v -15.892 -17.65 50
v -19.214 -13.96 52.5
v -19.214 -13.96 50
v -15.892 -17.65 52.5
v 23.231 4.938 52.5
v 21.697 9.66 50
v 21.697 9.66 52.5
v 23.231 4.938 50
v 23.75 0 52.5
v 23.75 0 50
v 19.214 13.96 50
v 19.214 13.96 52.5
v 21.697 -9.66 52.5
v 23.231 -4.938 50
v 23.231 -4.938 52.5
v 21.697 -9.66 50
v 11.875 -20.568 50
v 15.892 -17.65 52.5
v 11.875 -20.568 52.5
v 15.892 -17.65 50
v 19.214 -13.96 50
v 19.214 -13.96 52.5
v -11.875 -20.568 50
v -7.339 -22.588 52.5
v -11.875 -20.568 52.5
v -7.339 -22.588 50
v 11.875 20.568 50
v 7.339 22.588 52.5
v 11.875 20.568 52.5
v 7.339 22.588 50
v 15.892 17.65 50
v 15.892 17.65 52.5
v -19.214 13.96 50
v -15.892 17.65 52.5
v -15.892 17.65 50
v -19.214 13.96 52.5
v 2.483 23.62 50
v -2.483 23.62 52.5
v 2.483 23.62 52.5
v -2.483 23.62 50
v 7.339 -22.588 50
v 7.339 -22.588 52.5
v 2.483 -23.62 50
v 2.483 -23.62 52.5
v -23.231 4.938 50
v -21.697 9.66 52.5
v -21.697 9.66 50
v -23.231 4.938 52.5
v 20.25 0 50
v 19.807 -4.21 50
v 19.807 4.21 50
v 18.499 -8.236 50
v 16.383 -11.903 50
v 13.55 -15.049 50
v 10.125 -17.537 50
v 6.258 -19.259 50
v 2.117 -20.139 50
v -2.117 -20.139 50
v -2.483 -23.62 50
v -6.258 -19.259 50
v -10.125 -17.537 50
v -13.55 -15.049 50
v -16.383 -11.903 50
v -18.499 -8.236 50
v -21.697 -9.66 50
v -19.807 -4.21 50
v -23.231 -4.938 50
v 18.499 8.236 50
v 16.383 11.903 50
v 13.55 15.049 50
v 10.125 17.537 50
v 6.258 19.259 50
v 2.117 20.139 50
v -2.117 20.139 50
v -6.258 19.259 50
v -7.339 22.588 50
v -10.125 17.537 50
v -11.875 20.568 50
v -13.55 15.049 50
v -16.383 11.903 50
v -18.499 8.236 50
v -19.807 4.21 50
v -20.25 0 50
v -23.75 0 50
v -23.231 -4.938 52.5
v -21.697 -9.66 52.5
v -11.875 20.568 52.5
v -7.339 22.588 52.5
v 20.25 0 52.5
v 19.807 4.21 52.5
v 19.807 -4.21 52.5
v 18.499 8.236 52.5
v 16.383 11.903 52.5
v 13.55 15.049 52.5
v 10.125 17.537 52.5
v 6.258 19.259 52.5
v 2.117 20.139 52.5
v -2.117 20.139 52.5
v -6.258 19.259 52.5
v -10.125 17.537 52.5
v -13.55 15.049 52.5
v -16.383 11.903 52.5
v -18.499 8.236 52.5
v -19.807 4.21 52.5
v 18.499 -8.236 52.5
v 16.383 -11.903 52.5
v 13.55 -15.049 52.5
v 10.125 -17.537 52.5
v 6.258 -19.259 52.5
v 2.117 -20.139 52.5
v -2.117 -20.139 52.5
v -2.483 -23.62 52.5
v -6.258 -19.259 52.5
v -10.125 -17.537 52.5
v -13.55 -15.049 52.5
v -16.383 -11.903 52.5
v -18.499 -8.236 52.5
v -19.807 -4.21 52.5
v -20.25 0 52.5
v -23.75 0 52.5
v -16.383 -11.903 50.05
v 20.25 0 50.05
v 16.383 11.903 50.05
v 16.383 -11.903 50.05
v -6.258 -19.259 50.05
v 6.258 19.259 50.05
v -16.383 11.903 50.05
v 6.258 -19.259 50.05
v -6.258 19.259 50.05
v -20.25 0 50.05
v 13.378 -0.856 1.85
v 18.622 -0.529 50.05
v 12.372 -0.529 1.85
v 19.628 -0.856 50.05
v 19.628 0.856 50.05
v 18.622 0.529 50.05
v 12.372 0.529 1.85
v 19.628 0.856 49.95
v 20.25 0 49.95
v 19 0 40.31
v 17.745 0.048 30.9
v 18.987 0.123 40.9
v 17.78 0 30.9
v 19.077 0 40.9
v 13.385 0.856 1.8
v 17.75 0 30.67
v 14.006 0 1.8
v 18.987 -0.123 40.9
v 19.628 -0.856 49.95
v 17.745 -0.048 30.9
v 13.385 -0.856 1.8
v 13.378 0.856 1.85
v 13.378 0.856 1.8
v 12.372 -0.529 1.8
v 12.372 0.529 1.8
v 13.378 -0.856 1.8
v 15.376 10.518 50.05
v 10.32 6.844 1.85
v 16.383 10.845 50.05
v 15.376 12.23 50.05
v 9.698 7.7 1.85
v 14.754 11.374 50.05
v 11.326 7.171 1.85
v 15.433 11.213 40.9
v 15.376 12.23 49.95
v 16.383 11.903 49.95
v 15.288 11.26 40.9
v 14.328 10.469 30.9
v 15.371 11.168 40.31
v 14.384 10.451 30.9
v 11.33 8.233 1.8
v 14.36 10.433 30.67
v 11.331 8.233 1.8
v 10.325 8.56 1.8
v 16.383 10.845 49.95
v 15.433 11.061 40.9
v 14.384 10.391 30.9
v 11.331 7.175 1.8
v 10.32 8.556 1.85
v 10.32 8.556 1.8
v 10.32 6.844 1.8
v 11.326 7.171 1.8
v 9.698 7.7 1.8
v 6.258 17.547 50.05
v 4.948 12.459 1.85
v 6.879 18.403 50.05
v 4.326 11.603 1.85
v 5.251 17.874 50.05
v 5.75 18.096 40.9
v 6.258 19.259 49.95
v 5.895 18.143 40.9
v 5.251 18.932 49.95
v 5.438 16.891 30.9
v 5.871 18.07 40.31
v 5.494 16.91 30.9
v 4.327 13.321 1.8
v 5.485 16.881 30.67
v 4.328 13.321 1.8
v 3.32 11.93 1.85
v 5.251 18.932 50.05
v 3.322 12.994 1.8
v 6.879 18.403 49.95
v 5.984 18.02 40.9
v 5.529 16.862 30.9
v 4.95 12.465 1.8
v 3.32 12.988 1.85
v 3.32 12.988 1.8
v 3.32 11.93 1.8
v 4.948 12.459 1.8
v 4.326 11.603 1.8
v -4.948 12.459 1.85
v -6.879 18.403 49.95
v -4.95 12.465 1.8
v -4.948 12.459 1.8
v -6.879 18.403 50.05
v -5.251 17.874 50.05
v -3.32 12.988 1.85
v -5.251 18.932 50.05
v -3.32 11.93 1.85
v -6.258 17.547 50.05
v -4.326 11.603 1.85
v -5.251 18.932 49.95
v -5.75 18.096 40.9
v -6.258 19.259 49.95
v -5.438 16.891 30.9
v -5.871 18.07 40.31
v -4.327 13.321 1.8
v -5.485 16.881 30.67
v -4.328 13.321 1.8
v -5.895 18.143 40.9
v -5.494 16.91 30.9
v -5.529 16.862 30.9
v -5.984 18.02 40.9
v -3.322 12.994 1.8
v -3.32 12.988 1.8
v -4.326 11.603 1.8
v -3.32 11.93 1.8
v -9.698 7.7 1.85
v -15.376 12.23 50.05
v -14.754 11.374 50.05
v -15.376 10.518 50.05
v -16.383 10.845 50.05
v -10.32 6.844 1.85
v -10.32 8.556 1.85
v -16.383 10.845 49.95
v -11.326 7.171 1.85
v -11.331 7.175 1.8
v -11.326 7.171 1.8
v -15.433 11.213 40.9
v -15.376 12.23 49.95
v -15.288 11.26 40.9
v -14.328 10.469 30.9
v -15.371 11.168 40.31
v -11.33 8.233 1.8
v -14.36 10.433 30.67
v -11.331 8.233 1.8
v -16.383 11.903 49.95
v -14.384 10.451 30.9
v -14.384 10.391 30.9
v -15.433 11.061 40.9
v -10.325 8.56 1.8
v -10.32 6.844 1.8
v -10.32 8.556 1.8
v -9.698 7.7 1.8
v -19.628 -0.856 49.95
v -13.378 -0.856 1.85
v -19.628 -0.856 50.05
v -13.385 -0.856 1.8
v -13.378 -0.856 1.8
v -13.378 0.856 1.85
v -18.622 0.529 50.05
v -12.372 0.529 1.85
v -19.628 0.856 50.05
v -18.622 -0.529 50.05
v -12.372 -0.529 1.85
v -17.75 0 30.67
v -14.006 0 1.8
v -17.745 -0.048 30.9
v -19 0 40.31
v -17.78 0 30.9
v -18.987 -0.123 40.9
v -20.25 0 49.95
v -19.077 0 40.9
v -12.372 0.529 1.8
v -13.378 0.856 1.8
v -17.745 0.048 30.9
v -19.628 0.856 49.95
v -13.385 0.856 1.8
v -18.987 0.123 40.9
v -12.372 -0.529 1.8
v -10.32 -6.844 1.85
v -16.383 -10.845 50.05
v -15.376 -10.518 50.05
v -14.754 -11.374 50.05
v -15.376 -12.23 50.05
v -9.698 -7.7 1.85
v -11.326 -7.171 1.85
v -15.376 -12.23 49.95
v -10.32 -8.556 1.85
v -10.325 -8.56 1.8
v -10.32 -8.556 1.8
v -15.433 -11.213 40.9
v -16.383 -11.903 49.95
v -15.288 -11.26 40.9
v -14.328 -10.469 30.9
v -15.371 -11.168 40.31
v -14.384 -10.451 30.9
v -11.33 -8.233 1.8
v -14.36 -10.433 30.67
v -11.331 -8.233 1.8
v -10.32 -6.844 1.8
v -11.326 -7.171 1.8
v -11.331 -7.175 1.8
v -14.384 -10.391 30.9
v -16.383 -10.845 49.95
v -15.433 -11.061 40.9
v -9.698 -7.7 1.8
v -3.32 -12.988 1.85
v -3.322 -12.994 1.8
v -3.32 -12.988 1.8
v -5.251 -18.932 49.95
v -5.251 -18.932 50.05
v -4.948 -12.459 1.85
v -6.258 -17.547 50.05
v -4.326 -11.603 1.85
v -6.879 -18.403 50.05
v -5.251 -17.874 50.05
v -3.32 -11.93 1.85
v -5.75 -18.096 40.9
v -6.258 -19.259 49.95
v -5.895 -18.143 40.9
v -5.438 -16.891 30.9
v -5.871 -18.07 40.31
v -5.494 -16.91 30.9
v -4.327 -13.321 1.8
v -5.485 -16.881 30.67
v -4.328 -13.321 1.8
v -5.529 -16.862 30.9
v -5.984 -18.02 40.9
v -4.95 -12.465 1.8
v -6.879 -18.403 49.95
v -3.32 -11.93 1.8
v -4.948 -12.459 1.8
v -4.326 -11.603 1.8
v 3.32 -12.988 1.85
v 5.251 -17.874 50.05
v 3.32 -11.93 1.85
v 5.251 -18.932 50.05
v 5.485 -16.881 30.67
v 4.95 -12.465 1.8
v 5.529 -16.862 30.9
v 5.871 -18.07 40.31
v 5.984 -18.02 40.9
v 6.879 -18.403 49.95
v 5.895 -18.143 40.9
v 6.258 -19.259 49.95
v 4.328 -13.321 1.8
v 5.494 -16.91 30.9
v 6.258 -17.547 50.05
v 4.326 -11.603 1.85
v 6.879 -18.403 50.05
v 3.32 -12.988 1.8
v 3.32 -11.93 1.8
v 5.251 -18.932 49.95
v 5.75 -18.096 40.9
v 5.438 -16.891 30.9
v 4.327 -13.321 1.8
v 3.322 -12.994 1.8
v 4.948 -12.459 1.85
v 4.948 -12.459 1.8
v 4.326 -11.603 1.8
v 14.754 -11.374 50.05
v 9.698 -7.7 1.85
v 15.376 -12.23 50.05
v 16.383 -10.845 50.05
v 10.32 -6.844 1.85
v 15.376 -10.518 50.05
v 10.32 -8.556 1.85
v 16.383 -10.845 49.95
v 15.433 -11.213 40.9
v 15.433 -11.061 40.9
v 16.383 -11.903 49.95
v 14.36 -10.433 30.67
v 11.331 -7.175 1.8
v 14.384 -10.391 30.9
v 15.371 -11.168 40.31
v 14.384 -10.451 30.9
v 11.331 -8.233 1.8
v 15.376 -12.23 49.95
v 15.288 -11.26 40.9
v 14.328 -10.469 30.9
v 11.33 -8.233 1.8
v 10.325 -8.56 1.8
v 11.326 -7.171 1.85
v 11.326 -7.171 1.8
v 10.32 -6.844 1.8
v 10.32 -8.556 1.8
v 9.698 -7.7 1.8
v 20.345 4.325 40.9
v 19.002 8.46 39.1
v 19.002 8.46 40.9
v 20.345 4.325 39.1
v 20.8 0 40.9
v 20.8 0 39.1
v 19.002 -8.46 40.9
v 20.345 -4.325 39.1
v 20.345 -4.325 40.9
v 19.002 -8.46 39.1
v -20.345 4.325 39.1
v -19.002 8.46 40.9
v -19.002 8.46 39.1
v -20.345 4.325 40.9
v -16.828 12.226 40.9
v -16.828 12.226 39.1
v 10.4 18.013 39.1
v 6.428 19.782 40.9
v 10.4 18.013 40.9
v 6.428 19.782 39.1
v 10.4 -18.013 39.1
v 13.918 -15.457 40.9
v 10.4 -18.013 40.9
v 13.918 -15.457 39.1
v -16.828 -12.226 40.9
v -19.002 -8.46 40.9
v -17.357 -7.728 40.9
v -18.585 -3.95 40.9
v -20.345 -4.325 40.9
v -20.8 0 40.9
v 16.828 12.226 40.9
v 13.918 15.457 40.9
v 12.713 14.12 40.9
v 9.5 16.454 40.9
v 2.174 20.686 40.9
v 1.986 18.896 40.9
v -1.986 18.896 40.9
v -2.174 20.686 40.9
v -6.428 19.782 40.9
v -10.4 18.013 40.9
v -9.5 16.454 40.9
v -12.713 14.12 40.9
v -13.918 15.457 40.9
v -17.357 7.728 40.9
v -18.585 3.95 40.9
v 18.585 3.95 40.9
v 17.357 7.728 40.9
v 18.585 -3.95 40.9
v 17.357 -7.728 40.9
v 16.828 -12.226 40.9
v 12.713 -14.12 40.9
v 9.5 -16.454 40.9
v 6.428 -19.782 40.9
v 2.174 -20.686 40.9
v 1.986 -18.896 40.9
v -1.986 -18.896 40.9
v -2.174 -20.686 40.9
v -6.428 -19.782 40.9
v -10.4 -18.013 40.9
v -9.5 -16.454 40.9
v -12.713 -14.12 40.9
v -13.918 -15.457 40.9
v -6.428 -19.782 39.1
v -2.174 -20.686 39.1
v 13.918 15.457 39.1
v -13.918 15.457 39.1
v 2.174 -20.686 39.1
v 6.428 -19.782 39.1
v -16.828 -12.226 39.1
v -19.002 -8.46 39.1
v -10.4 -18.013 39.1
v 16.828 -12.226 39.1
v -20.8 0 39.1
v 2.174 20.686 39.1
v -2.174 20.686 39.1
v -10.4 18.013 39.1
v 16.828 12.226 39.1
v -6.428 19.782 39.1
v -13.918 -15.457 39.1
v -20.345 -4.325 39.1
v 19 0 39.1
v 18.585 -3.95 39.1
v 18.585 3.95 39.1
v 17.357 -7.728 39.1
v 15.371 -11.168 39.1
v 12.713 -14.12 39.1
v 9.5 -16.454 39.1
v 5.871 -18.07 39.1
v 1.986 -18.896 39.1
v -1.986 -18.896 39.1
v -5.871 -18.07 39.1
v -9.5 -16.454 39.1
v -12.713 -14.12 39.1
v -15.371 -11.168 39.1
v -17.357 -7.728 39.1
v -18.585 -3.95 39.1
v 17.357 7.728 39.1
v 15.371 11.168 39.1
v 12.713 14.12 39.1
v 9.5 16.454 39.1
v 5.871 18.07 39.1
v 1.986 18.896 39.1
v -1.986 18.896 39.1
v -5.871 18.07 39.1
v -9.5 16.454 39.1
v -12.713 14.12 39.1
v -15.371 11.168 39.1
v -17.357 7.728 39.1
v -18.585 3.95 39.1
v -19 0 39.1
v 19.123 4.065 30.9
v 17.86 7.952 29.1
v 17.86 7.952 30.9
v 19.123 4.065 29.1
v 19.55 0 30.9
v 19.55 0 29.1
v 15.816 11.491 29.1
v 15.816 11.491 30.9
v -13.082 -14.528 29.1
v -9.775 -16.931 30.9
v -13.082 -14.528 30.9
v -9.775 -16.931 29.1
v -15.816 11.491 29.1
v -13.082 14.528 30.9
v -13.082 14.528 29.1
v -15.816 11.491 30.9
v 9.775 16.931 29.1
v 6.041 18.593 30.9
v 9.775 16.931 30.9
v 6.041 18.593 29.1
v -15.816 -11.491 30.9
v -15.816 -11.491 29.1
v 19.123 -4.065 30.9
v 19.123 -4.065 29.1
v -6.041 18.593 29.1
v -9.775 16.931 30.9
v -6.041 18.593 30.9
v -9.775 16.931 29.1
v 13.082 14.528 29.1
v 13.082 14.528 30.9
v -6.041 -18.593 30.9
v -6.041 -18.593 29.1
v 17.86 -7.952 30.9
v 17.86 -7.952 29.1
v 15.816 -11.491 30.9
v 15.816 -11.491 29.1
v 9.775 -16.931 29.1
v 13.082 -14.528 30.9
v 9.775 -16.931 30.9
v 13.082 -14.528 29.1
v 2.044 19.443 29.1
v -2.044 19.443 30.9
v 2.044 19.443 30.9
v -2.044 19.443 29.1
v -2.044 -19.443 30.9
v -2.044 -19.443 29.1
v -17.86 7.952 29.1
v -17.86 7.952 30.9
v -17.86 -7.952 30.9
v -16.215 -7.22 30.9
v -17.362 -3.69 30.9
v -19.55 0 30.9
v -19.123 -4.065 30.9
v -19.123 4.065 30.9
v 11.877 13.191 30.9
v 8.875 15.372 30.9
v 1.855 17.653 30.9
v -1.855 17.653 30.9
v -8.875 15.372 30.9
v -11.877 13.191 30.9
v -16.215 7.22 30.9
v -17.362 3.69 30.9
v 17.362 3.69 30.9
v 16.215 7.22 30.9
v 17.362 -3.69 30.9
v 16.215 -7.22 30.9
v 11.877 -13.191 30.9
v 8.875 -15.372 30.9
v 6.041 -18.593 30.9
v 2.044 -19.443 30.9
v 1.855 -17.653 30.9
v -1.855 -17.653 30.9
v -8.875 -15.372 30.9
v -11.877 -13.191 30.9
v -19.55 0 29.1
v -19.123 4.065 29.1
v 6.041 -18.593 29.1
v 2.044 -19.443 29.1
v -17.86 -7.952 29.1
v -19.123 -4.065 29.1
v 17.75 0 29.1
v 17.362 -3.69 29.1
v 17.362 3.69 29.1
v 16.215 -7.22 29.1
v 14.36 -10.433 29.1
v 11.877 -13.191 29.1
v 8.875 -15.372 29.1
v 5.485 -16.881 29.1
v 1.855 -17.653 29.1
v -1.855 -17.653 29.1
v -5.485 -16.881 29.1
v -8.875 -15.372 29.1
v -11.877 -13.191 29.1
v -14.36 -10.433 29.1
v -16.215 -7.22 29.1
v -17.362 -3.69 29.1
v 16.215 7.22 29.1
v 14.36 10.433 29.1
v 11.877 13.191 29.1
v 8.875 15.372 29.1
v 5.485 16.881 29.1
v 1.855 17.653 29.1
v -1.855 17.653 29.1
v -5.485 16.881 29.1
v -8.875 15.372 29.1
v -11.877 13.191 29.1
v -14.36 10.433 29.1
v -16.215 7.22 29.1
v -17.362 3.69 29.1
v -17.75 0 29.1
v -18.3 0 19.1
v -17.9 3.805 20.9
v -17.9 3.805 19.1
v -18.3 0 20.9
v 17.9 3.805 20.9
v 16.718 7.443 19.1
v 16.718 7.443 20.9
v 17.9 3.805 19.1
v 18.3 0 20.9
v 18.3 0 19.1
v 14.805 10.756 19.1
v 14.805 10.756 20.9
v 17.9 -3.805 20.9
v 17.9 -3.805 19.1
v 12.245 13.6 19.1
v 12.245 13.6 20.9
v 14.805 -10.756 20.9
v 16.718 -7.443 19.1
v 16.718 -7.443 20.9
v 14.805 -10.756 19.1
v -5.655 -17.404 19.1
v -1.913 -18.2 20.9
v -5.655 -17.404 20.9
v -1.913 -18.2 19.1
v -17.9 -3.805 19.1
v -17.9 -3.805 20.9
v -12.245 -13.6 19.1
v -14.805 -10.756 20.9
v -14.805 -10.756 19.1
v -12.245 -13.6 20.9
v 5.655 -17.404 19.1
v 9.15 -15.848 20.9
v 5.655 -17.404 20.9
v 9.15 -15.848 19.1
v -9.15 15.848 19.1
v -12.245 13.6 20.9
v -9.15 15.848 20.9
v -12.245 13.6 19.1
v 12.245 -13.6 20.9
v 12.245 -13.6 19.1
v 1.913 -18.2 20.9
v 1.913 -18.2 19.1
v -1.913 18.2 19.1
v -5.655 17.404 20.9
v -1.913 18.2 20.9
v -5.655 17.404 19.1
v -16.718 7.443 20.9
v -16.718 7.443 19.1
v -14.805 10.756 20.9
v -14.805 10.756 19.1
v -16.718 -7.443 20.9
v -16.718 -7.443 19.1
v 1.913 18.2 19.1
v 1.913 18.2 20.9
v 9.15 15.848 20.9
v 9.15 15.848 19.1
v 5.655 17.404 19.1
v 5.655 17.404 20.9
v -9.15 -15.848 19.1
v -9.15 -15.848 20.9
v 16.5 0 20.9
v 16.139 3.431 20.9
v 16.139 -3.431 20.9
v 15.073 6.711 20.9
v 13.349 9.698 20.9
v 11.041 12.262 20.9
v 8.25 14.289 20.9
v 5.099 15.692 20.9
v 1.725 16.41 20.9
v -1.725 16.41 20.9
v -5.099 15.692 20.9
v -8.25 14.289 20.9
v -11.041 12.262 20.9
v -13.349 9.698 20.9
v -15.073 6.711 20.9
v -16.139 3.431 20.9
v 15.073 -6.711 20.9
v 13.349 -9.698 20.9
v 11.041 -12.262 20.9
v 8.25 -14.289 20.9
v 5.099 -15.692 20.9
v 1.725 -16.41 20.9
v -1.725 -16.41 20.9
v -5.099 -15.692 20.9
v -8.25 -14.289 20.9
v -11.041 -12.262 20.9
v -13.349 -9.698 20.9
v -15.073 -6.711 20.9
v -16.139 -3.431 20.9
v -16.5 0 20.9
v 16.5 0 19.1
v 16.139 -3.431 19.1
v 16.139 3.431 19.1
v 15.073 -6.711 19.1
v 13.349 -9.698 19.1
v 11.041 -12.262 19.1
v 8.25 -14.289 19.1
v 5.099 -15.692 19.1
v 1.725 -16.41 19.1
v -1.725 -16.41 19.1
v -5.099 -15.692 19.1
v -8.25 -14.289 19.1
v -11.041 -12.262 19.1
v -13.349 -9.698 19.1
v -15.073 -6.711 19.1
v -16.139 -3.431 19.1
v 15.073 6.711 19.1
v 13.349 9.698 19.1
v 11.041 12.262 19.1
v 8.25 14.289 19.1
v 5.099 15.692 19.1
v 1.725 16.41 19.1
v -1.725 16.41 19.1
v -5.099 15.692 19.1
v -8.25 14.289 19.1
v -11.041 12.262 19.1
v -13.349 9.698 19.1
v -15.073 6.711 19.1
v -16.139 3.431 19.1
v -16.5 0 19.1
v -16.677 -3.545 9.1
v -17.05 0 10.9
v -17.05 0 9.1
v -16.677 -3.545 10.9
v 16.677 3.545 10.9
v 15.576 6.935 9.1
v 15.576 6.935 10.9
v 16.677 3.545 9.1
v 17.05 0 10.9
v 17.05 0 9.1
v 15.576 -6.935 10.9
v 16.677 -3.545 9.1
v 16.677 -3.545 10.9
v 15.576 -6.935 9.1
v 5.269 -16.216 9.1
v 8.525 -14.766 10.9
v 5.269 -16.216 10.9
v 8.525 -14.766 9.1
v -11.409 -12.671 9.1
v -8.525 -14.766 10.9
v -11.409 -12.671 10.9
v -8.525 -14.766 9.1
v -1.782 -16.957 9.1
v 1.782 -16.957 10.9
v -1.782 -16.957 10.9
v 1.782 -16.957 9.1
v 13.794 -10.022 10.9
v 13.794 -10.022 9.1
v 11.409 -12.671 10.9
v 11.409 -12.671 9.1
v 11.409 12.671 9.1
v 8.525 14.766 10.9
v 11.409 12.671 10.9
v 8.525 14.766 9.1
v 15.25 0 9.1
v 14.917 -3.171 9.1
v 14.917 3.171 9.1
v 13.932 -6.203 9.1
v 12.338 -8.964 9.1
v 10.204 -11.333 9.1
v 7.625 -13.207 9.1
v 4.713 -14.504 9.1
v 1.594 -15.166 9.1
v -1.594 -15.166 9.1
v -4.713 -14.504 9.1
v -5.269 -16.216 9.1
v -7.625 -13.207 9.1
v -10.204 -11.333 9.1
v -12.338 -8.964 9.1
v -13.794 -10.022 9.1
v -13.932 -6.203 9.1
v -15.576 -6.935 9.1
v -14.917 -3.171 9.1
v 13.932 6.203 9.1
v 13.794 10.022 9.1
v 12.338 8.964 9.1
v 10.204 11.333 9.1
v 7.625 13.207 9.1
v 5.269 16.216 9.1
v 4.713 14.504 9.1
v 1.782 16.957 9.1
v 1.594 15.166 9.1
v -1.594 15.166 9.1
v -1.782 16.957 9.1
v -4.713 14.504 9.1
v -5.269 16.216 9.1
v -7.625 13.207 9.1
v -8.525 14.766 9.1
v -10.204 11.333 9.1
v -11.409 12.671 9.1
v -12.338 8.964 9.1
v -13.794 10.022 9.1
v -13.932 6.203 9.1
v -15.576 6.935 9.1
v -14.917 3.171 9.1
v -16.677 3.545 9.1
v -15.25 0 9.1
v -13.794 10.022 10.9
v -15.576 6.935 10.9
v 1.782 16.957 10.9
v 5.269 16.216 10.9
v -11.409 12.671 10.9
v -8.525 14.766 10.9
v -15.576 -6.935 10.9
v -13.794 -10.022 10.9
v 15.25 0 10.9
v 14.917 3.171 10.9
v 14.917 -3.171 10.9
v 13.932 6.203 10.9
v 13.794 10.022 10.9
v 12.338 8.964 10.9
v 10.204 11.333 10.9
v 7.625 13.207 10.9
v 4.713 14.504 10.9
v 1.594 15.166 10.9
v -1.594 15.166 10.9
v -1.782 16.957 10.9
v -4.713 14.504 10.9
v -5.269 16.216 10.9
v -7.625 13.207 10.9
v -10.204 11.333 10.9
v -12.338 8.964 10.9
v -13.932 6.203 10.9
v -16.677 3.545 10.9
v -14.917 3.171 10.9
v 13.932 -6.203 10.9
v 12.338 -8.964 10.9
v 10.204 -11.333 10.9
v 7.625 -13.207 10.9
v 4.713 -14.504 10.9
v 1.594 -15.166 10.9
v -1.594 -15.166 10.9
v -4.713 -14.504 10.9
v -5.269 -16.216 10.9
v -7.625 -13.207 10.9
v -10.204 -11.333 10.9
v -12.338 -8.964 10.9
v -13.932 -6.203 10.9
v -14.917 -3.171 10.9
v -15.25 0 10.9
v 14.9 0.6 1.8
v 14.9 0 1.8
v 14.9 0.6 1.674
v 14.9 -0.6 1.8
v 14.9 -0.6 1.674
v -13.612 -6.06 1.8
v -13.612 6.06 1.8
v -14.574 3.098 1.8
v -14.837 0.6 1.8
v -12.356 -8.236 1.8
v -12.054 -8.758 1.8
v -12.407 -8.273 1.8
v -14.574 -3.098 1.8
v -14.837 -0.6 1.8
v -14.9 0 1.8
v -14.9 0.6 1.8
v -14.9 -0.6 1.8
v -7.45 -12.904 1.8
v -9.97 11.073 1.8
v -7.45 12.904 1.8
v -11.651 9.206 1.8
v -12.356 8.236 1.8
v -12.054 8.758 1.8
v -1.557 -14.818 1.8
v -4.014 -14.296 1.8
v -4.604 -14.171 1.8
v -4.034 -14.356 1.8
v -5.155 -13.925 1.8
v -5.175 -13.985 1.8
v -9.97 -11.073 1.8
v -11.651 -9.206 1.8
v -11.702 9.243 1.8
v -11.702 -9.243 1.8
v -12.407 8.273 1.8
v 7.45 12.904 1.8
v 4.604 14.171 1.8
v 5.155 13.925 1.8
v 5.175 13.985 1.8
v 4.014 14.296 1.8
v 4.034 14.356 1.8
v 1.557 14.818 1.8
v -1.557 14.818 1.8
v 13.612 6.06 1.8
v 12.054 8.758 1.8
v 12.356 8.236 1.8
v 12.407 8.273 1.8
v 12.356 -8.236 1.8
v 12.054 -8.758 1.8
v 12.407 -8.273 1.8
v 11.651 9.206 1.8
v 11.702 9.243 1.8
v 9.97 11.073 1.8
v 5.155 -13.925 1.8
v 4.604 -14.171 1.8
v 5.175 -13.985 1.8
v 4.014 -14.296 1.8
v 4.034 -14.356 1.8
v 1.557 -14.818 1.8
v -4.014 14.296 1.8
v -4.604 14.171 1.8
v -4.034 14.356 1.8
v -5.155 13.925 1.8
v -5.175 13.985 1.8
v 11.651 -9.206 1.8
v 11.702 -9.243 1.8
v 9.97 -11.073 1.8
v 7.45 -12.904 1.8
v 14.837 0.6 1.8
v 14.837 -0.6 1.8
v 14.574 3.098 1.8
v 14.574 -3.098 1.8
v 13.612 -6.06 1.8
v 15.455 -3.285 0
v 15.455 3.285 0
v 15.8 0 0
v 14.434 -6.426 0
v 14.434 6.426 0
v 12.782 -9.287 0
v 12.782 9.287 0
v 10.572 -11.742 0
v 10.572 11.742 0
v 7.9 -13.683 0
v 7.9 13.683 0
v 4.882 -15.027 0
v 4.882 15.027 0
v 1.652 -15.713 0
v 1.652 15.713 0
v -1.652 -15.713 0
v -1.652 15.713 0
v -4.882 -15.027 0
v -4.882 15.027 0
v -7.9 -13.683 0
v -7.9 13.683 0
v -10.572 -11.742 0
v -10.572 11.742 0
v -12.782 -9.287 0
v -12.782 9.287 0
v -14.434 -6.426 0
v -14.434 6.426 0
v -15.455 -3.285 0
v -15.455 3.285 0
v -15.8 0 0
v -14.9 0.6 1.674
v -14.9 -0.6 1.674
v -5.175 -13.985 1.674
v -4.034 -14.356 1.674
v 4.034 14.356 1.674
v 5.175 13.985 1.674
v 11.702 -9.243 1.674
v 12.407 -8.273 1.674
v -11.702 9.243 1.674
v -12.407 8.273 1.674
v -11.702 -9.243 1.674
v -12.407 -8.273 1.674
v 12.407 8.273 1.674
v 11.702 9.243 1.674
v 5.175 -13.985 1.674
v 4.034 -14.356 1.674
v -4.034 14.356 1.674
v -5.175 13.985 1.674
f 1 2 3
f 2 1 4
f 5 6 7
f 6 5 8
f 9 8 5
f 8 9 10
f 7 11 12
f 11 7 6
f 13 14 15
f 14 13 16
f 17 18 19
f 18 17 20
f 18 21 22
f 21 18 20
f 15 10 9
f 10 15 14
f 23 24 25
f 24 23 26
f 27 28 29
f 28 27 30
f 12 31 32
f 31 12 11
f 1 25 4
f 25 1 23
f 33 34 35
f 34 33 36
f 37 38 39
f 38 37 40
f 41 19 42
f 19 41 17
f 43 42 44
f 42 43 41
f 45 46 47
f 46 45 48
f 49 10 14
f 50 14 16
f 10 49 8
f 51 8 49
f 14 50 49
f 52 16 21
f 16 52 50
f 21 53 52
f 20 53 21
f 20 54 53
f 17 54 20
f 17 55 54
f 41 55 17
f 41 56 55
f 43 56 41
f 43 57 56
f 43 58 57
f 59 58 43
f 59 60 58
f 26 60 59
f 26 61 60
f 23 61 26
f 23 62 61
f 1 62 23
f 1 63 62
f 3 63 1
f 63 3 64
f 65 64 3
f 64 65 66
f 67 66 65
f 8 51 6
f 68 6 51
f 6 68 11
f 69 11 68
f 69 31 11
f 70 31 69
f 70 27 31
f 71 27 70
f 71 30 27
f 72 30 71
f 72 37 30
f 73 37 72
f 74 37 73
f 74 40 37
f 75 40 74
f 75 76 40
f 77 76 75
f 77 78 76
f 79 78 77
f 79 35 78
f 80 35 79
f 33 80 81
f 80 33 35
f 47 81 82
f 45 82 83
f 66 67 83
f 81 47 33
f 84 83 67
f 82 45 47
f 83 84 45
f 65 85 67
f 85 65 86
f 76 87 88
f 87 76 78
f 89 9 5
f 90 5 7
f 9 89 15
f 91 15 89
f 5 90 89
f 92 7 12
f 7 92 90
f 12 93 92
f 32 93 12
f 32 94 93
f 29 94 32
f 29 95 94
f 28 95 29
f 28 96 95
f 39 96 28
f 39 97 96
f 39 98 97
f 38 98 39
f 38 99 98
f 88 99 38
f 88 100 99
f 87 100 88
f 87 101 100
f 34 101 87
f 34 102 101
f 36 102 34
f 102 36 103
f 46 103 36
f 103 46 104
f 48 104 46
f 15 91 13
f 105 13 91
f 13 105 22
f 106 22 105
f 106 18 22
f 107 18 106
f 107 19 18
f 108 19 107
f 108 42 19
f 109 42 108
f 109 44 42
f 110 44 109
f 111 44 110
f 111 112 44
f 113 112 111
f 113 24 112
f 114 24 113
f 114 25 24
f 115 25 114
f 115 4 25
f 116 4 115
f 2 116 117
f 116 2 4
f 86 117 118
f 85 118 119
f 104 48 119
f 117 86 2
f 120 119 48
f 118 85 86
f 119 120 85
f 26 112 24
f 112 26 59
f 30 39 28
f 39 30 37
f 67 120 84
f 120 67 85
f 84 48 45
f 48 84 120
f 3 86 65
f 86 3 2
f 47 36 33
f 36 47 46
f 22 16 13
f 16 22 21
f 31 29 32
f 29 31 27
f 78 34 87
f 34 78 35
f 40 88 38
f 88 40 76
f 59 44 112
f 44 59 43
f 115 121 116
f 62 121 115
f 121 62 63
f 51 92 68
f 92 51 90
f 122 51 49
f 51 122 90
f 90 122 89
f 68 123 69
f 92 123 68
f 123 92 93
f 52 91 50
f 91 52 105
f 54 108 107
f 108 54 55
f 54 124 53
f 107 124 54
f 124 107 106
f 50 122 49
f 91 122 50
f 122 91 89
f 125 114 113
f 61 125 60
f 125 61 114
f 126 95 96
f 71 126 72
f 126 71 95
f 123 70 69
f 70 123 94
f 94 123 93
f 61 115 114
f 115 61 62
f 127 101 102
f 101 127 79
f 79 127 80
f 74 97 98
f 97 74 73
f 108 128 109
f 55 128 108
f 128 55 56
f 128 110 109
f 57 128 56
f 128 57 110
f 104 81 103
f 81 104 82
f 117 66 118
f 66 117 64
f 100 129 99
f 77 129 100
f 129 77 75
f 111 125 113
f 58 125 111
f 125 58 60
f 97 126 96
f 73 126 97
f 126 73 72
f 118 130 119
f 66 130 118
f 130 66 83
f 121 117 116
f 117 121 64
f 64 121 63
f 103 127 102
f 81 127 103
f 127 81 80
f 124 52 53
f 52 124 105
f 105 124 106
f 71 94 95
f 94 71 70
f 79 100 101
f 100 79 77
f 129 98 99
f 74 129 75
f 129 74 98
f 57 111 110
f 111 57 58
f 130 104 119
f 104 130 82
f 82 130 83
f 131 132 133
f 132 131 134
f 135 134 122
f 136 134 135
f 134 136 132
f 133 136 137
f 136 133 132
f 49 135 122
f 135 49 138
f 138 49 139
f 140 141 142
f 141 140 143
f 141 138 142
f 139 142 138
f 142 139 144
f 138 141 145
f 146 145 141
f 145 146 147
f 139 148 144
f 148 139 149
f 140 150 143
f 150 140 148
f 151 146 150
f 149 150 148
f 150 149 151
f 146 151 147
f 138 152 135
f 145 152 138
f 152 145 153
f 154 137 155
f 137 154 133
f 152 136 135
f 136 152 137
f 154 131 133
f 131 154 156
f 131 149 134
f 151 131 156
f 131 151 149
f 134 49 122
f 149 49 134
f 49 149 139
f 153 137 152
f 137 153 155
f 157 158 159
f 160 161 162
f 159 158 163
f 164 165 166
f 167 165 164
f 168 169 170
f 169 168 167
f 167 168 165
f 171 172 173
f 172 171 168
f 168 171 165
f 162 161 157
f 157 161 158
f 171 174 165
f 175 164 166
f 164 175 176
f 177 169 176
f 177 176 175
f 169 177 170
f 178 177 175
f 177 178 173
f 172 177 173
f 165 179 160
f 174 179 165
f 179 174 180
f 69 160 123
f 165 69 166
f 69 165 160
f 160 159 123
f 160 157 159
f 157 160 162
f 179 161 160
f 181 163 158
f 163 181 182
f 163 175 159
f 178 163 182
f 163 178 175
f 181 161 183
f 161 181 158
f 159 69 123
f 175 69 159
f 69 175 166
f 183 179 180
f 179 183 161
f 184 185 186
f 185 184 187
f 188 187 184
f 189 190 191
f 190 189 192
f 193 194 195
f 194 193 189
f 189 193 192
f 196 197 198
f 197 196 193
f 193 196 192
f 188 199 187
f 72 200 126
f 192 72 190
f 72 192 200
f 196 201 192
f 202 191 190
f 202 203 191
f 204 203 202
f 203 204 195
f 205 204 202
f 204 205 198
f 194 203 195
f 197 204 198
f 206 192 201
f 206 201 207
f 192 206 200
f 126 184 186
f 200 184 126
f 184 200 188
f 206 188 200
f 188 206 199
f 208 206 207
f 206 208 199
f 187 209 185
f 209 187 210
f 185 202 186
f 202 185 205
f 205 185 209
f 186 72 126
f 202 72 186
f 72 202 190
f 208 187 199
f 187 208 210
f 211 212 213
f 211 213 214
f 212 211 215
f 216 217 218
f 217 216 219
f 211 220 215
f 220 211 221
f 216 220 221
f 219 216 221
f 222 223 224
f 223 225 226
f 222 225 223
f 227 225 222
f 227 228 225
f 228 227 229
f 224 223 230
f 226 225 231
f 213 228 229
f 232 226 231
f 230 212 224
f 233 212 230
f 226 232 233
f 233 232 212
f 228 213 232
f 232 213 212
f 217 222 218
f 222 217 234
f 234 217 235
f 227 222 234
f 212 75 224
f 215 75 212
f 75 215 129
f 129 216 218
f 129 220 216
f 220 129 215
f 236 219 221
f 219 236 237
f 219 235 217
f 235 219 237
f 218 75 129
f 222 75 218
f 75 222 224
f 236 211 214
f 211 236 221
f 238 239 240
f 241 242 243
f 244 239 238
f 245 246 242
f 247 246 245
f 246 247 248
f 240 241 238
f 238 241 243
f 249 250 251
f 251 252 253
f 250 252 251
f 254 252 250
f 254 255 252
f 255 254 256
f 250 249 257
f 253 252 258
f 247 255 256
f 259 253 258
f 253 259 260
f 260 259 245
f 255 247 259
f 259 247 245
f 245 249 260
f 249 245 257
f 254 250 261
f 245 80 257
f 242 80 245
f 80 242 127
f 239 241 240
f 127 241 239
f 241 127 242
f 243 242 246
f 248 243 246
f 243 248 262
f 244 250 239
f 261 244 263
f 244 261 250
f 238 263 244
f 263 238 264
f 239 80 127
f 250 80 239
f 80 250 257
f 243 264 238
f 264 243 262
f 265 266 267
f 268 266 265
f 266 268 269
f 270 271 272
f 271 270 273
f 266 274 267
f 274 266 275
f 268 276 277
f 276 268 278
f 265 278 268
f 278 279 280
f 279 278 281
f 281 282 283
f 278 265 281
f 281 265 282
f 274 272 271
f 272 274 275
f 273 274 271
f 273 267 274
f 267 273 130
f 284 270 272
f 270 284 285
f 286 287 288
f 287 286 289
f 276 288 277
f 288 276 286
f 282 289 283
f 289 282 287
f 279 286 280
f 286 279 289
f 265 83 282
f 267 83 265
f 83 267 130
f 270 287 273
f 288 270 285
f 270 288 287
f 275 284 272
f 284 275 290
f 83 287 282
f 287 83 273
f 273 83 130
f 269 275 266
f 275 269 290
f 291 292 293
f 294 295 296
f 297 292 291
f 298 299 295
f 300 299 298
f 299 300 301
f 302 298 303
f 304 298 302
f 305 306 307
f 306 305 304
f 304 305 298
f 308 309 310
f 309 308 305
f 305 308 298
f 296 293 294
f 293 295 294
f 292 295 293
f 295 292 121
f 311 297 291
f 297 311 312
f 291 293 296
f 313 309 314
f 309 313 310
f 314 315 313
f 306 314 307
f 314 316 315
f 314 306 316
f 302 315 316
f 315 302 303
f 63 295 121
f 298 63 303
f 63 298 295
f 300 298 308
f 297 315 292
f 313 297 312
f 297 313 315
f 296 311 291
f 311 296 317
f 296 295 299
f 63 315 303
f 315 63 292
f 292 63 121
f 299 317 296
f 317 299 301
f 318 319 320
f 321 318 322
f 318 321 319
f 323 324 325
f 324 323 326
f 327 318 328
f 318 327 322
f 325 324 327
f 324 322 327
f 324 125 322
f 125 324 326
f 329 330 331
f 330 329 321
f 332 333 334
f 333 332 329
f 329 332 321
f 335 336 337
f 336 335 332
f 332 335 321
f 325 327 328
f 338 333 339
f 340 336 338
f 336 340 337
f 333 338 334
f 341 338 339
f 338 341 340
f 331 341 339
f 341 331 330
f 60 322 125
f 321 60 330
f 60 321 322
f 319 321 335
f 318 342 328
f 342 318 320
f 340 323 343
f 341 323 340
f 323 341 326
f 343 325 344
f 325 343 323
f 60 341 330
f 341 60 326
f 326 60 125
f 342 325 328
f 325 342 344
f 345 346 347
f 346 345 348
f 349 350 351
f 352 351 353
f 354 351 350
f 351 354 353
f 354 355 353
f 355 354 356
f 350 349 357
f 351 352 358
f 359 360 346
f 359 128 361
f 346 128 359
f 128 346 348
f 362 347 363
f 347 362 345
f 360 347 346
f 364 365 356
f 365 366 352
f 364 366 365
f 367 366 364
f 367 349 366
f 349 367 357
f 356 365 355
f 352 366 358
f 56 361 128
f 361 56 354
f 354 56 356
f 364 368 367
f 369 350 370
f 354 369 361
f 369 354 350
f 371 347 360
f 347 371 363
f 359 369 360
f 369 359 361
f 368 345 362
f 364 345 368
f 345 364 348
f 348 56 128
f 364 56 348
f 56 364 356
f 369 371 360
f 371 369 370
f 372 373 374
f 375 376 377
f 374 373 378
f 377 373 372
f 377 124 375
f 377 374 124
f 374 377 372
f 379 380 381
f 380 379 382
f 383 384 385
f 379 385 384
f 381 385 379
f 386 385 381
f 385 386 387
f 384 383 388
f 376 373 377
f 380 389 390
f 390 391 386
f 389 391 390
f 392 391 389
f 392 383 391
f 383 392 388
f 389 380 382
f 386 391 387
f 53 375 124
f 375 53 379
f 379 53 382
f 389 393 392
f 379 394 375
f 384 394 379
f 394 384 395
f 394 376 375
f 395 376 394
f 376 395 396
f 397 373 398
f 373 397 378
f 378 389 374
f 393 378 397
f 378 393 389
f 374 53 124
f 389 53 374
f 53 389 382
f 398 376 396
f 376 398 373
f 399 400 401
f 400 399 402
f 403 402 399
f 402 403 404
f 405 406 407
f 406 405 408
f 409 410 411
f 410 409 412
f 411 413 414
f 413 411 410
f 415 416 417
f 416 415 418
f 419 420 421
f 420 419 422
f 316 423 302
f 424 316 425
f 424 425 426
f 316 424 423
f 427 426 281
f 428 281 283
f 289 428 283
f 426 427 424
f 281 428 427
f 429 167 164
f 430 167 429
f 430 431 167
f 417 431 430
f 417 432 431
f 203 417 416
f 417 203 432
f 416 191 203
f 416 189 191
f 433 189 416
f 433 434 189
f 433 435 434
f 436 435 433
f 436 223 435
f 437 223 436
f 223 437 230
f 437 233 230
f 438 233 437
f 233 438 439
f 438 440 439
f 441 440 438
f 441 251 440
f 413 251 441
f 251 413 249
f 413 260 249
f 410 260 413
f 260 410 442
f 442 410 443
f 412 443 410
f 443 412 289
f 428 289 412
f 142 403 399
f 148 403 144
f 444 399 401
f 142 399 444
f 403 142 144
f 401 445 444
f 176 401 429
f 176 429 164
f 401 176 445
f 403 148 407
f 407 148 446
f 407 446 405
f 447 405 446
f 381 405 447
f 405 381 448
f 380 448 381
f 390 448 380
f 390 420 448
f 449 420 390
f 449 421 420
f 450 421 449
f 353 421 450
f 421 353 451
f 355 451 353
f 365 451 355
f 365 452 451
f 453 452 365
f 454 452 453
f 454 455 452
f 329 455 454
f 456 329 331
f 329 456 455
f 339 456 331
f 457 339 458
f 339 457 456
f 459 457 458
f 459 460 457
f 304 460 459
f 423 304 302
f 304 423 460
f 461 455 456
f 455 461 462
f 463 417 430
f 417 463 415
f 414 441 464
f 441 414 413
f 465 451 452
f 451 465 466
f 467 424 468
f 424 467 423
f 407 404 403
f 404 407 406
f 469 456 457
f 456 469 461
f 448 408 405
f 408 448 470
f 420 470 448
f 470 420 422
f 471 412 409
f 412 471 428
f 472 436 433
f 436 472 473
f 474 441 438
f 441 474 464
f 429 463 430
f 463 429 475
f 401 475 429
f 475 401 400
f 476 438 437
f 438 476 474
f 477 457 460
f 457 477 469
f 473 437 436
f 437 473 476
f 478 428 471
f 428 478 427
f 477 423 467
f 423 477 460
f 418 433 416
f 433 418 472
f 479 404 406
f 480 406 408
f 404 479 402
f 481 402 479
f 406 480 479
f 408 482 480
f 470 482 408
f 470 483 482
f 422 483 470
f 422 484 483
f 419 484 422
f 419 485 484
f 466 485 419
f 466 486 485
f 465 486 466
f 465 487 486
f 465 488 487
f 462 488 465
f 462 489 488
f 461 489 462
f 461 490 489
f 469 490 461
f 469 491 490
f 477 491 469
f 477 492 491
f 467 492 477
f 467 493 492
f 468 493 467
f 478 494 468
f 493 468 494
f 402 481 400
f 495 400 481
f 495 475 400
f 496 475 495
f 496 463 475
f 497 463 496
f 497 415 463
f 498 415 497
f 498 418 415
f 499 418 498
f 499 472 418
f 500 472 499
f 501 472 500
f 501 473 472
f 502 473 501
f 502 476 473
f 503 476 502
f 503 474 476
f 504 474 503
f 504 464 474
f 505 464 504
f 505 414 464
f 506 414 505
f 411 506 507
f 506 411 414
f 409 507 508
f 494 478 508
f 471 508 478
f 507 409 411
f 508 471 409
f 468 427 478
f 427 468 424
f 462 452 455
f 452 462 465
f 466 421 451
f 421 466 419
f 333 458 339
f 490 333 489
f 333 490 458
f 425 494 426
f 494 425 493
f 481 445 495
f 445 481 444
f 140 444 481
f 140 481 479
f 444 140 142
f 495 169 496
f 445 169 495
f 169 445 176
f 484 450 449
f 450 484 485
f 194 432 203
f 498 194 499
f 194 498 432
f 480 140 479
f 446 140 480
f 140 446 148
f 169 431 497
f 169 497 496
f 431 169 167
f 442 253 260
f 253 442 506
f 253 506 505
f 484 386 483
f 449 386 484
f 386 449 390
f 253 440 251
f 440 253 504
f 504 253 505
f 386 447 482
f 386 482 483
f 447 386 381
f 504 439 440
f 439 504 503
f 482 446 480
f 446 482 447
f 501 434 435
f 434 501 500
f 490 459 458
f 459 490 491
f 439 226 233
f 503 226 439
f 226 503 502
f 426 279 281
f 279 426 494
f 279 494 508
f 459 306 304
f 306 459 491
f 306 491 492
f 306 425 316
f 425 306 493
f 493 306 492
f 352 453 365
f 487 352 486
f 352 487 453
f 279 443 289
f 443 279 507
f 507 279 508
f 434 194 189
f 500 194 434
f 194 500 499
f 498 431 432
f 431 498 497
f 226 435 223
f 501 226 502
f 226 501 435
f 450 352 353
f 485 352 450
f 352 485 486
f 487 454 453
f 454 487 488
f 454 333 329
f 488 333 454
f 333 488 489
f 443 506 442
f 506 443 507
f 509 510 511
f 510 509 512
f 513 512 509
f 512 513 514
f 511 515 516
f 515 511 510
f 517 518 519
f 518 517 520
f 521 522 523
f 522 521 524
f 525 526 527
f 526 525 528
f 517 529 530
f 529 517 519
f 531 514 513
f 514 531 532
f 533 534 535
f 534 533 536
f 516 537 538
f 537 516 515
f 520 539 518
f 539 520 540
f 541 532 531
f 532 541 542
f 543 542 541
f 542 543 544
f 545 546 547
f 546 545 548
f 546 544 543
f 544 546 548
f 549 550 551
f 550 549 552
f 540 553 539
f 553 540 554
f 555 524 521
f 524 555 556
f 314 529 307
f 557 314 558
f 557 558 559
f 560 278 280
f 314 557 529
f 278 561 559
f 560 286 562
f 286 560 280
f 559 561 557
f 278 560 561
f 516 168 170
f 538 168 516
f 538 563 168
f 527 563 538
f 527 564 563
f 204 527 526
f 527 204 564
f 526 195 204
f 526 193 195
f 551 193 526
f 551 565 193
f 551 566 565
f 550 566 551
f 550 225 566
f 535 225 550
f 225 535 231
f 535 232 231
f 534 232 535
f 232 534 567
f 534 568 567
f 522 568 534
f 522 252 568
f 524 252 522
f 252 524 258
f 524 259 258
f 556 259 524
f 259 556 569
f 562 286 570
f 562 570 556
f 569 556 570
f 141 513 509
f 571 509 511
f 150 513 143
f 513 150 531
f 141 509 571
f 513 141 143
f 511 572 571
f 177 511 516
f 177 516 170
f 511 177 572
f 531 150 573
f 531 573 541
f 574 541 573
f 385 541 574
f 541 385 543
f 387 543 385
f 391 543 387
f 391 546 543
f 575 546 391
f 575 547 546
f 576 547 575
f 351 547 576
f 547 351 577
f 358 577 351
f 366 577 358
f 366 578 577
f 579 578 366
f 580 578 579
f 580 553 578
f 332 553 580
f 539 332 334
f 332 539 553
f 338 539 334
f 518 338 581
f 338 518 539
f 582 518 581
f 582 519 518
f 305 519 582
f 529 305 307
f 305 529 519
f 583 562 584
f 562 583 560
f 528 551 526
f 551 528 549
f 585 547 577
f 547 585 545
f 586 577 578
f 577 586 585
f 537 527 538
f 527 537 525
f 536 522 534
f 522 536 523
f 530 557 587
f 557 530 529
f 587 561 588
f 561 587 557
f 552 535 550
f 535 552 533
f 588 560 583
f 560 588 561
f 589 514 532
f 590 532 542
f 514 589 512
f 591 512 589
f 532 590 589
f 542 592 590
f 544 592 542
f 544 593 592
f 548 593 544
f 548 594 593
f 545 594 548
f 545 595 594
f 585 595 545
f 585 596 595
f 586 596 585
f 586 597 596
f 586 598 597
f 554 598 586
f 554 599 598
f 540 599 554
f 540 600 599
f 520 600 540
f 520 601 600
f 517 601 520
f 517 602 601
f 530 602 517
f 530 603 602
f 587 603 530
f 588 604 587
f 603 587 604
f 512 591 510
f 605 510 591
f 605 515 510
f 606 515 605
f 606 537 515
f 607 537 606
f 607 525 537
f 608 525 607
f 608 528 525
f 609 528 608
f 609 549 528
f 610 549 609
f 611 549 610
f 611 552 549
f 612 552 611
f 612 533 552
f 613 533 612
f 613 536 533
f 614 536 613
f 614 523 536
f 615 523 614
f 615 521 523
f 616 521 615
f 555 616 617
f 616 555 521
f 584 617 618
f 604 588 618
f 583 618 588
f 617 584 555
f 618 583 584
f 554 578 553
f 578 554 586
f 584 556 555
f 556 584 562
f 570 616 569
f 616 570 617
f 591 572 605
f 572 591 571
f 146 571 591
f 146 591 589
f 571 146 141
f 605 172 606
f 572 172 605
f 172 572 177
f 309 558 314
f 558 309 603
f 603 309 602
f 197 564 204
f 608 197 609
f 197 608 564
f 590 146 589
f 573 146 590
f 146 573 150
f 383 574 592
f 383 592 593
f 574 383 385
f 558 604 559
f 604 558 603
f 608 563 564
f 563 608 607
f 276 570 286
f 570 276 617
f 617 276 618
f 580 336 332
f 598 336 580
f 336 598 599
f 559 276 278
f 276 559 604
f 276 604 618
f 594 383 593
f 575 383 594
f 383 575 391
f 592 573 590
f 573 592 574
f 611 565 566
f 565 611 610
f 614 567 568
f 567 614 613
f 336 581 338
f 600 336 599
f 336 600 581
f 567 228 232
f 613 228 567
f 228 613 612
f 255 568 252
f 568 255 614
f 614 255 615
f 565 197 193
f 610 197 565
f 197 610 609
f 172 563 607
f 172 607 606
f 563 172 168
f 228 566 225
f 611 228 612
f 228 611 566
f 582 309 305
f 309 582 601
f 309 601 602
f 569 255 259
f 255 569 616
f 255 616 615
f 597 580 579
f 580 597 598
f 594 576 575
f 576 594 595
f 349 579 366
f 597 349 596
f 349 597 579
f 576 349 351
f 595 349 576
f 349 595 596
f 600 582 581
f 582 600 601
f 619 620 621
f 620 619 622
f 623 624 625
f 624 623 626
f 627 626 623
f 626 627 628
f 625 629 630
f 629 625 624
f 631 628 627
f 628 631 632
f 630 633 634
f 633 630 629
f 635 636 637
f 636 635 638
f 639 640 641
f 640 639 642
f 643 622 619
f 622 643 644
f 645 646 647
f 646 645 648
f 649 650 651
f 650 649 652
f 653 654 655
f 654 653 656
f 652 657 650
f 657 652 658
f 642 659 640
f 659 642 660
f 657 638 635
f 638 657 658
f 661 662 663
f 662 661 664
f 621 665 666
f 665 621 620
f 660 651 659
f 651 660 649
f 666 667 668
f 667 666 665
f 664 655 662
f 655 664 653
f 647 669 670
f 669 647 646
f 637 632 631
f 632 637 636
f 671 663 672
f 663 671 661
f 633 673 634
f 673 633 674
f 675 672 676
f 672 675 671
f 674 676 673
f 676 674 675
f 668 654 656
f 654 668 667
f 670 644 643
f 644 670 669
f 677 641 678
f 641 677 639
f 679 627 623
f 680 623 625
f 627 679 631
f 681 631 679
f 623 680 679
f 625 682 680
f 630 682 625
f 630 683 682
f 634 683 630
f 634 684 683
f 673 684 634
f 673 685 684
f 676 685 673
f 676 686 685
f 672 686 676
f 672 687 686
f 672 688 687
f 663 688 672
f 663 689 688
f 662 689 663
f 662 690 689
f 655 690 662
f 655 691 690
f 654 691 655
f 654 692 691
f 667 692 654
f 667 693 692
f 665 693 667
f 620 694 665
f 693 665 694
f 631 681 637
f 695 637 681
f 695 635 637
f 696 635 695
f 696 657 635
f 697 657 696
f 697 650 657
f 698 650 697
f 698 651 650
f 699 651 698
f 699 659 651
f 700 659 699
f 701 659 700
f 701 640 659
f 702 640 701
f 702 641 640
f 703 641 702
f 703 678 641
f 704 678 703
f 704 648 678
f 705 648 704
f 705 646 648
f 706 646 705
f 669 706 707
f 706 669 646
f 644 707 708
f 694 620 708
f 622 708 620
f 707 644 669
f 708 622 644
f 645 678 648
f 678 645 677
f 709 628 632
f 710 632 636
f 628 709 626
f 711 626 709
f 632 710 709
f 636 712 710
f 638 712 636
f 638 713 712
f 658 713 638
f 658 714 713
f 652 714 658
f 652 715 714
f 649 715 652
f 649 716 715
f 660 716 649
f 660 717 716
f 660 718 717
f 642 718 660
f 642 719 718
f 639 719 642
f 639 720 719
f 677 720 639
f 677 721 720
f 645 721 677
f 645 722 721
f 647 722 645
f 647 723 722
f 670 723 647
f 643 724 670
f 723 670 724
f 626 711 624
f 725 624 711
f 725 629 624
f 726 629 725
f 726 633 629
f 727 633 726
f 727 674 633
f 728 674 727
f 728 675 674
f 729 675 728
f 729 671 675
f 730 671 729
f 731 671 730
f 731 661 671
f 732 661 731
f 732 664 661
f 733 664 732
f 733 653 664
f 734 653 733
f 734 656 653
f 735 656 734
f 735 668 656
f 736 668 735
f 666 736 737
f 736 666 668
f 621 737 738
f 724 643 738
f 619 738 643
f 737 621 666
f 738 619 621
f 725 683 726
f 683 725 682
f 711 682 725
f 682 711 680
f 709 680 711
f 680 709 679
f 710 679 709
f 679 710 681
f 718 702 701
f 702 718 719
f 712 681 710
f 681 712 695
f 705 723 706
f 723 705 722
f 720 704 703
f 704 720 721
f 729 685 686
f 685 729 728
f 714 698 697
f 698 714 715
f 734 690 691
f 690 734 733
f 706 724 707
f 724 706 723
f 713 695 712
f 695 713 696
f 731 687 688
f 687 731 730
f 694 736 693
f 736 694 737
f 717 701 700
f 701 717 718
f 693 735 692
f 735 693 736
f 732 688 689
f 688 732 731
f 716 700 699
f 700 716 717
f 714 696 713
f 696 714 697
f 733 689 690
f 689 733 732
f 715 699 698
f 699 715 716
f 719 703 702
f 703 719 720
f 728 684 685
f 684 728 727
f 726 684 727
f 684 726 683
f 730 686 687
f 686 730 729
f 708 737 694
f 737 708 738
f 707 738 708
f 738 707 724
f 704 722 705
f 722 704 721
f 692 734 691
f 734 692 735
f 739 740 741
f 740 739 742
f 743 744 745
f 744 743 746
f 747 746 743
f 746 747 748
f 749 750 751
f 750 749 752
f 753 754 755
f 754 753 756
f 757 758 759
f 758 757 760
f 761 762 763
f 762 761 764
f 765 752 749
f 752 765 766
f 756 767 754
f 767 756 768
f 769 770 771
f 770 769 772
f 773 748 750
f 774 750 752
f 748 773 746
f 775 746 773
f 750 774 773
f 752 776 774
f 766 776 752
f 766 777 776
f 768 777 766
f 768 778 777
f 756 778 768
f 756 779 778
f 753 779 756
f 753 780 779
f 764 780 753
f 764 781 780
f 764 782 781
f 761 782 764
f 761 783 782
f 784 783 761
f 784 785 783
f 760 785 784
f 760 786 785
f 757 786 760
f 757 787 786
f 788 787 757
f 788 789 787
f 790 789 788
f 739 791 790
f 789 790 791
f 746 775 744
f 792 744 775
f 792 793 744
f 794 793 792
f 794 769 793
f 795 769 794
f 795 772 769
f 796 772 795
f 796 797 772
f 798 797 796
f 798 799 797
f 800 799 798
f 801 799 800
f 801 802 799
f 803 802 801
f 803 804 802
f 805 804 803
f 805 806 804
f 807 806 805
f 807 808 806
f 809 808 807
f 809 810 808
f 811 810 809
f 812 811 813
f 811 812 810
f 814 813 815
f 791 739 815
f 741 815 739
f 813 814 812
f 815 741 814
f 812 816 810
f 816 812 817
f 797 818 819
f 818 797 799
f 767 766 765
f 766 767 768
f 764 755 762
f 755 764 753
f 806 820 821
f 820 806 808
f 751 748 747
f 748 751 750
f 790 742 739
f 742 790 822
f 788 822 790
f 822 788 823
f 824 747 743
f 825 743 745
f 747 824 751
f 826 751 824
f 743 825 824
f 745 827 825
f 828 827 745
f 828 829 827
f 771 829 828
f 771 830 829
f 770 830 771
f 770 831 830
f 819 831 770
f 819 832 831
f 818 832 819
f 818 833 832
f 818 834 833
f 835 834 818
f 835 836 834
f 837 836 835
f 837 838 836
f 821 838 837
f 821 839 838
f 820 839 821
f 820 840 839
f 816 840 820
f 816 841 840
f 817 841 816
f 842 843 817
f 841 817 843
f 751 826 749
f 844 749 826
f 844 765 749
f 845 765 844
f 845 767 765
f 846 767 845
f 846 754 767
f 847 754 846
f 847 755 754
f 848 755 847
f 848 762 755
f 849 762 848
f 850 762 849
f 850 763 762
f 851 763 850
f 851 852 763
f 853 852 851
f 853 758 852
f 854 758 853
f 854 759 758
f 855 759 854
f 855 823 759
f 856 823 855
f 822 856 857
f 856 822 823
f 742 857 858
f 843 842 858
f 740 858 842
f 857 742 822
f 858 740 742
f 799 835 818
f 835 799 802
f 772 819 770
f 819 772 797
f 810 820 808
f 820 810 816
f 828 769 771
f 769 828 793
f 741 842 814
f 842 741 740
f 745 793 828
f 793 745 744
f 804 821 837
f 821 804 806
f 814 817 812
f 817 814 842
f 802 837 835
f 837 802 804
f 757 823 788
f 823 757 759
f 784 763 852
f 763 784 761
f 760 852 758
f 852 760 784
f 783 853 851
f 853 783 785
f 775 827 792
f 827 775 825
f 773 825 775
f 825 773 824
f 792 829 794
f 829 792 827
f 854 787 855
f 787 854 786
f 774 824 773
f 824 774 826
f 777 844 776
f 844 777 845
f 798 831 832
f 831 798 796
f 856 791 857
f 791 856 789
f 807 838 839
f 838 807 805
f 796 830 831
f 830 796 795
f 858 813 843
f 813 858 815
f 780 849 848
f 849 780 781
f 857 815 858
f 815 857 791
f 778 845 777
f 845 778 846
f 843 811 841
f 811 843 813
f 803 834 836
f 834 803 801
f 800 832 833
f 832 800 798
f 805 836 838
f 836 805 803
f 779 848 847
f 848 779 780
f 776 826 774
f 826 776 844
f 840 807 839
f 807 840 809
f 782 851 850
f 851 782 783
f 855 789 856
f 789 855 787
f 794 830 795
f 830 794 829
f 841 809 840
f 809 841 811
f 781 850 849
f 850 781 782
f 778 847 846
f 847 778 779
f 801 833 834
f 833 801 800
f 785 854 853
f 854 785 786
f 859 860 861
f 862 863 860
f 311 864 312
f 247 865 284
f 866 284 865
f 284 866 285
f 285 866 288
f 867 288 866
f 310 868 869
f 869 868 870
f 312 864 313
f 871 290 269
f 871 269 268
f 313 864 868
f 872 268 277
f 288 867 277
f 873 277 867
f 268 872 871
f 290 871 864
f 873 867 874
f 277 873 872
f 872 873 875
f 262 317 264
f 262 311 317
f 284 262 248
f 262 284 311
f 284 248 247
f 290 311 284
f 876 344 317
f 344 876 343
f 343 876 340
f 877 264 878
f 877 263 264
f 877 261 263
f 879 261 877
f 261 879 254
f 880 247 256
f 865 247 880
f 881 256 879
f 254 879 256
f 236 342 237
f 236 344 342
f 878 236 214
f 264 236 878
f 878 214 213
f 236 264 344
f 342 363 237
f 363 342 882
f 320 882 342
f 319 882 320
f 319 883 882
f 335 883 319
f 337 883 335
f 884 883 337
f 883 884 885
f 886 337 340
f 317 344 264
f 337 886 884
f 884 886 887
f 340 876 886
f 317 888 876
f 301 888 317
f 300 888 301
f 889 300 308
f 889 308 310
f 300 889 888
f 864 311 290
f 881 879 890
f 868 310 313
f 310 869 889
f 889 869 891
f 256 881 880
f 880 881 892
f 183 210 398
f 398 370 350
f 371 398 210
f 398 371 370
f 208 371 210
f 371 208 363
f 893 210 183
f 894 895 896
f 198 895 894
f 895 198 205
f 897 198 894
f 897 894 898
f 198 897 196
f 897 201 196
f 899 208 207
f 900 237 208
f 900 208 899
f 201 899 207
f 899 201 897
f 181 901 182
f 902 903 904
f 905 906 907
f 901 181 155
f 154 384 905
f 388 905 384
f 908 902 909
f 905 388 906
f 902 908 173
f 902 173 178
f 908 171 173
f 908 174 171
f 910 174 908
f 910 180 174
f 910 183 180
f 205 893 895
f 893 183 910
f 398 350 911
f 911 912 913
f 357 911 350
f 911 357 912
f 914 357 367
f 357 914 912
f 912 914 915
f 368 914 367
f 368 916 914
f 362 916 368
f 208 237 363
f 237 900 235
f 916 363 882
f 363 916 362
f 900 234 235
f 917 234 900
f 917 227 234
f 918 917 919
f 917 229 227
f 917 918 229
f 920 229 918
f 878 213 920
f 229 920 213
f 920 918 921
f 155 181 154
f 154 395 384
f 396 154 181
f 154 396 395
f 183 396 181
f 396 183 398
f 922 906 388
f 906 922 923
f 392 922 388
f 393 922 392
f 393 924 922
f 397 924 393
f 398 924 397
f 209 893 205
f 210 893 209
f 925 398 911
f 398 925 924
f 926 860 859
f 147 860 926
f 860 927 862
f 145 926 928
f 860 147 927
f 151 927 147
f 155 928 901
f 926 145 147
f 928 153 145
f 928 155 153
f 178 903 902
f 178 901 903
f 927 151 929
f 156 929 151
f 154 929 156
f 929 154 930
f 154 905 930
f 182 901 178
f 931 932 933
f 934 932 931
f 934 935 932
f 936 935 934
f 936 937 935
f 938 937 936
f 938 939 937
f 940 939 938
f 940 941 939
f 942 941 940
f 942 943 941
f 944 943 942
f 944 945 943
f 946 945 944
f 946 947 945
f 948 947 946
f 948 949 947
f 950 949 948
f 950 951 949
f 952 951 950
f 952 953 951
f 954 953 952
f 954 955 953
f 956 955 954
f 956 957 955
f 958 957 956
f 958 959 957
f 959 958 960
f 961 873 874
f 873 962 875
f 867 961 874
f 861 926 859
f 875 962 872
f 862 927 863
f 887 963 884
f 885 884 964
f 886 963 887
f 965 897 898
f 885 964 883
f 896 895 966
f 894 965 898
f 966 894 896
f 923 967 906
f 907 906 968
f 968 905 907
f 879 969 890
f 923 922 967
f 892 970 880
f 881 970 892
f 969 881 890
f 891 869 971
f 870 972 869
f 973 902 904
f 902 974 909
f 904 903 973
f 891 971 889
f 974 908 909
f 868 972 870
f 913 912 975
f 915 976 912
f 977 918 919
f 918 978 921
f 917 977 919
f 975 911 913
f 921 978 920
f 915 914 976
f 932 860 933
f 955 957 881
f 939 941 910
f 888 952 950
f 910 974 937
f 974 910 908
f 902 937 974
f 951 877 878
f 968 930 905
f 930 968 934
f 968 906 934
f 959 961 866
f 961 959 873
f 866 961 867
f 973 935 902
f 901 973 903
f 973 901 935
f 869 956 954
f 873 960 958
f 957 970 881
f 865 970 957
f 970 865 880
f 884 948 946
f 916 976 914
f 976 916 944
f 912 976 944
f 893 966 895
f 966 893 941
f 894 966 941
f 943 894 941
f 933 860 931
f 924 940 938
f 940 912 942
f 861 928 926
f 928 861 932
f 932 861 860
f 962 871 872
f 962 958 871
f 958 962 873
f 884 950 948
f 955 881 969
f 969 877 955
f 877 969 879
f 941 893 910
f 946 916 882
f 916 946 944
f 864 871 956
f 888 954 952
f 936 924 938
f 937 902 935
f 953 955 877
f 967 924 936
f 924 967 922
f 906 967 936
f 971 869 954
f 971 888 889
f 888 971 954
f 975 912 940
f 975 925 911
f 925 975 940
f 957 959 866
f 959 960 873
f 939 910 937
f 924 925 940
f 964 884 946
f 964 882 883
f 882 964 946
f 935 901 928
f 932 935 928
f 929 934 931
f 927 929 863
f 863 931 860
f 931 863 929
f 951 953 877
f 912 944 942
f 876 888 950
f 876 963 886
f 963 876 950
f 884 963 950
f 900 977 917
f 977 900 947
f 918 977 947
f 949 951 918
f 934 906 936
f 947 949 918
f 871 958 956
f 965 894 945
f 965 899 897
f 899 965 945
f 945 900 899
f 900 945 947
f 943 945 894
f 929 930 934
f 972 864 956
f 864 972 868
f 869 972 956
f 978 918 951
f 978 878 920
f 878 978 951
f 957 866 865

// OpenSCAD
// === СЕТЧАТЫЙ СТАКАНЧИК ДЛЯ ГИДРОПОНИКИ (ИСПРАВЛЕННЫЙ) ===

module net_pot_printable() {
    // --- ПАРАМЕТРЫ СТАКАНЧИКА ---
    pot_top_id = 40.5; 
    pot_bot_id = 28;   
    pot_height = 50;   
    pot_wall_th = 1.8; 
    pot_rim_w = 3.5;   
    pot_rim_h = 2.5;   
    pot_mesh_cols = 10; 
    pot_mesh_rows = 4;  

    translate([0,0,pot_height]) { 
        // --- А. Прочный верхний бортик ---
        difference() {
            cylinder(d = pot_top_id + 2*pot_rim_w, h = pot_rim_h);
            translate([0,0,-1]) cylinder(d = pot_top_id, h = pot_rim_h+2);
        }

        // --- Б. Вертикальные ребра каркаса ---
        for (i = [0:pot_mesh_cols-1]) {
            rotate([0, 0, i * 360/pot_mesh_cols])
            hull() {
                translate([pot_top_id/2 - pot_wall_th/2, 0, 0])
                    cylinder(d = pot_wall_th, h = 0.1, center=true);
                translate([pot_bot_id/2 - pot_wall_th/2, 0, -pot_height + pot_wall_th])
                    cylinder(d = pot_wall_th, h = 0.1, center=true);
            }
        }

        // --- В. Горизонтальные кольца сетки (ИСПРАВЛЕНО) ---
        for (j = [1:pot_mesh_rows]) {
            h_pos = - (pot_height / (pot_mesh_rows+1)) * j;
            
            // Правильная интерполяция: от широкого верха к узкому дну
            current_id = pot_top_id - (pot_top_id - pot_bot_id) * (-h_pos / pot_height);
            
            translate([0,0,h_pos])
            difference() {
                cylinder(d = current_id + 2*pot_wall_th, h = pot_wall_th, center = true);
                cylinder(d = current_id, h = pot_wall_th + 1, center = true);
            }
        }

        // --- Г. Прочное дно ---
        translate([0,0,-pot_height]) {
            cylinder(d1 = pot_bot_id + 2*pot_wall_th, d2 = pot_bot_id + 1*pot_wall_th, h = pot_wall_th);
            
            // Крестообразная сетка на дне
            for (k = [0:pot_mesh_cols/2-1]) {
                rotate([0,0, k * 360 / (pot_mesh_cols/2)])
                    translate([0,0, pot_wall_th/2])
                    cube([pot_bot_id + pot_wall_th, pot_wall_th/1.5, pot_wall_th], center=true);
            }
        }
    }
}

// Вызов для проверки
net_pot_printable();
